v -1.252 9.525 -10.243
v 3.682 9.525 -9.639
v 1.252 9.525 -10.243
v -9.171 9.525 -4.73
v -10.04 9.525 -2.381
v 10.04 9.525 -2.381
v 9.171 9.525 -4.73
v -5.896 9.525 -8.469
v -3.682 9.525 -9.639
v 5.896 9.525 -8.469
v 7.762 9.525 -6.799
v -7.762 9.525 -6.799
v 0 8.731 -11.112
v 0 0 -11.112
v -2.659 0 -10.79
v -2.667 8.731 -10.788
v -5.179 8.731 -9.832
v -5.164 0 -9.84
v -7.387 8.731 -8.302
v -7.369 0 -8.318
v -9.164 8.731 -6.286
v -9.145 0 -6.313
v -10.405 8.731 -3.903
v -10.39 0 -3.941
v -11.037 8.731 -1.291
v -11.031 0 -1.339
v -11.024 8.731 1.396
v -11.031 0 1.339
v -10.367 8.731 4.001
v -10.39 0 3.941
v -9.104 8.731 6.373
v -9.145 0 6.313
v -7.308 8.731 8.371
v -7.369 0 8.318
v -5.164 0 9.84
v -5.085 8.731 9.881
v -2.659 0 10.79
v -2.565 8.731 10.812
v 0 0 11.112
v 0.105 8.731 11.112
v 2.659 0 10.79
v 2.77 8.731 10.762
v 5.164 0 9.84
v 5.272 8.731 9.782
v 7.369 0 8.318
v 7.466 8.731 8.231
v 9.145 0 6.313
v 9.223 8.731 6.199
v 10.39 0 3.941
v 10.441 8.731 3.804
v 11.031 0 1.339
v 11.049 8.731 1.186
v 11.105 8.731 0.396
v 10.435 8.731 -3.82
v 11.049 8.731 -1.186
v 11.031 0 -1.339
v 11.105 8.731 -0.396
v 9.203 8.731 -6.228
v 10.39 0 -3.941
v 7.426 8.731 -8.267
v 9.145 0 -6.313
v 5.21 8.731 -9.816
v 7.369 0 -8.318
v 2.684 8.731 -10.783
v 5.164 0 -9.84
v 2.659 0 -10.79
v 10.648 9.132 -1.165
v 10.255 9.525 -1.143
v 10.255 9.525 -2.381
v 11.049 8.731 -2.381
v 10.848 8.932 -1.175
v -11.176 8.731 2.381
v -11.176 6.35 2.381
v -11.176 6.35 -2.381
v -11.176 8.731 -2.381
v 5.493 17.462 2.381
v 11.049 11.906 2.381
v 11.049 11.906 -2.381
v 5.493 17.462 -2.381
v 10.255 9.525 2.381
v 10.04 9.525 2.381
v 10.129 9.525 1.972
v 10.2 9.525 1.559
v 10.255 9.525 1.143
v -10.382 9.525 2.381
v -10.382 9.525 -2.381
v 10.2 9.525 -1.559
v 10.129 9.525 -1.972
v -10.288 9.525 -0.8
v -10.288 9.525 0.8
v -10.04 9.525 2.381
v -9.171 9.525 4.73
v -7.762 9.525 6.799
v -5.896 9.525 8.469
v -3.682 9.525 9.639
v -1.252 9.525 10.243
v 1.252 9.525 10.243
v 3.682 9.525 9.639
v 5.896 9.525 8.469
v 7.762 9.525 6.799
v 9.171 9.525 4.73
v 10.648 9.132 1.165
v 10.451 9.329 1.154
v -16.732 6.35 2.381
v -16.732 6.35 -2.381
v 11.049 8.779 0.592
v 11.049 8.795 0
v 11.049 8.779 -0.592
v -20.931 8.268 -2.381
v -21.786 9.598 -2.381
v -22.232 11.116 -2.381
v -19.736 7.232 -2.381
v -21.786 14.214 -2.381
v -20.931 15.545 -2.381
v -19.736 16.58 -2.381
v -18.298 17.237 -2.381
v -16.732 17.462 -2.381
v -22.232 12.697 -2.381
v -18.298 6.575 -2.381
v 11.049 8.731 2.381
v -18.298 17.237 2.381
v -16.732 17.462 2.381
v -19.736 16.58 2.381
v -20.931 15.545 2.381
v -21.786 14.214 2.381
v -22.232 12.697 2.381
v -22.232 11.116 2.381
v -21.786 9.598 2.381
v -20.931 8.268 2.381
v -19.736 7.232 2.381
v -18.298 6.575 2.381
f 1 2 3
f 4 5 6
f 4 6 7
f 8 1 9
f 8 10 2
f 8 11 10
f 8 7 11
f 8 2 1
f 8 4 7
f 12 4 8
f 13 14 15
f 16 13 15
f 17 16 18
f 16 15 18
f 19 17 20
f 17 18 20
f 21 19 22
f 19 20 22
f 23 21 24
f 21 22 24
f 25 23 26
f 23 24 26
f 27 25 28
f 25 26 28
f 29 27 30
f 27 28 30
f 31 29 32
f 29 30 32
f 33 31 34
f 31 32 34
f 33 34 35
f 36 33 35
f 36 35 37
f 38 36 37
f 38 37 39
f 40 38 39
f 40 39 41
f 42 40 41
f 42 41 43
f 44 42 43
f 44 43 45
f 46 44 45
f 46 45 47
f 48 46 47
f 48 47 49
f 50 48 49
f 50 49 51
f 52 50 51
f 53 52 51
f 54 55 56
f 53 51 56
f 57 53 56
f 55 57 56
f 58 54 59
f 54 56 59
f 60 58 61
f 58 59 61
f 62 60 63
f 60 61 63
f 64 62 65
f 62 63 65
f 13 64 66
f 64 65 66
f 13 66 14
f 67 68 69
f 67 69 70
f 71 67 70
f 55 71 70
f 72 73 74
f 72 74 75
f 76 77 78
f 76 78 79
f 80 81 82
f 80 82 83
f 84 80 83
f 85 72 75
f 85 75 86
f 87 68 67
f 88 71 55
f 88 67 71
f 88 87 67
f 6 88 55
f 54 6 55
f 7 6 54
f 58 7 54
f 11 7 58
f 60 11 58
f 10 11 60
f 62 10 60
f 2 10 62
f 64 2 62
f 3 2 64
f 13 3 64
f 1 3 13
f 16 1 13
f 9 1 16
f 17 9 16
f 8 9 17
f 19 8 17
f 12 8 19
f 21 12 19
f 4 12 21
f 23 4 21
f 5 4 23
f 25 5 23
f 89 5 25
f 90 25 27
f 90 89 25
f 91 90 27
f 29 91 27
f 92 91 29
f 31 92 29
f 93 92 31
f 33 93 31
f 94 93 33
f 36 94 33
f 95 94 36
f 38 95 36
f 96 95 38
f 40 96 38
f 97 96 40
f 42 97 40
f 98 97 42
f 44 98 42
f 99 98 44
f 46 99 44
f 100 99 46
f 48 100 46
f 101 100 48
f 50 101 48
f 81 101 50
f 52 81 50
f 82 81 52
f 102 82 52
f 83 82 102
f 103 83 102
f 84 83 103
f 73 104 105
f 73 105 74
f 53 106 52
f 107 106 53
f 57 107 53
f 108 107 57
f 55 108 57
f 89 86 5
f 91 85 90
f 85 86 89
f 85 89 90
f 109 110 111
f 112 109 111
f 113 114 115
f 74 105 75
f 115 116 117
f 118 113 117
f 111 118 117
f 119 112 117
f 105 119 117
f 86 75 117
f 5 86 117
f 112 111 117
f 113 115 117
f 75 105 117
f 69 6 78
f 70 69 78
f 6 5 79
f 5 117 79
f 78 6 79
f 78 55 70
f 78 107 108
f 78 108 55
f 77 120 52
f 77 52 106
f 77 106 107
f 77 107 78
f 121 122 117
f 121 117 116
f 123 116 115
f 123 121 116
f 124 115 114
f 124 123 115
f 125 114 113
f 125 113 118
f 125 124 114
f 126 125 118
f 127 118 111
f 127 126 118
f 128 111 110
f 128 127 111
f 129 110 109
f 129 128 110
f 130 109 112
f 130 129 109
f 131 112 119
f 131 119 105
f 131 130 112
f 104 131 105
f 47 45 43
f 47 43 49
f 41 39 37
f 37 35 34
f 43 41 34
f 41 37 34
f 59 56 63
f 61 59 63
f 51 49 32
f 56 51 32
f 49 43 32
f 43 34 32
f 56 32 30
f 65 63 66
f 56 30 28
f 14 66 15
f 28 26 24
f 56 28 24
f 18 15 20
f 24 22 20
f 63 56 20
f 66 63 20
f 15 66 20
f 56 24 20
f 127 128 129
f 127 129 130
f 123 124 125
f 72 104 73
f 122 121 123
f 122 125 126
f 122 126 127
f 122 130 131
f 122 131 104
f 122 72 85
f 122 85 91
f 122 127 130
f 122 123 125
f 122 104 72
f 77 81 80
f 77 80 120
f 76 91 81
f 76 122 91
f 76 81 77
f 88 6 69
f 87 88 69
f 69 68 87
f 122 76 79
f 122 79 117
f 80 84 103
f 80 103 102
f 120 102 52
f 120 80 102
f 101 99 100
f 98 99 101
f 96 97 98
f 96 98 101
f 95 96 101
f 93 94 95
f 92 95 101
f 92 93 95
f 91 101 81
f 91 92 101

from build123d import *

# Parameters (mm, degrees)
SKETCH1_R            = 11.1125
BOSS_EXTRUDE1_DEPTH  = 9.525
CHAMFER1_SIZE        = 0.79375
BOSS_EXTRUDE30_DEPTH = 2.38125


with BuildPart() as part:
    # Sketch1 → Boss-Extrude1 (new body)
    with BuildSketch(Plane(origin=(0, 0, 0), x_dir=(1, 0, 0), z_dir=(0, 1, 0))):
        with Locations(Location((0, 0, 0), (0, 0, 90))):
            Circle(SKETCH1_R)
    extrude(amount=BOSS_EXTRUDE1_DEPTH)

    # Chamfer1
    chamfer1_edges = [part.edges().sort_by_distance(p)[0] for p in [
        (0, 9.525, 11.1125),
    ]]
    chamfer(chamfer1_edges, length=CHAMFER1_SIZE)

    # Sketch2 → Boss-Extrude30 (add, symmetric)
    with BuildSketch(Plane.XY):
        with BuildLine():
            Line((11.049, 8.73125), (11.049, 11.90625))
            Line((11.049, 11.90625), (5.49275, 17.4625))
            Line((5.49275, 17.4625), (-16.73225, 17.4625))
            ThreePointArc((-16.73225, 17.4625), (-22.2885, 11.90625), (-16.73225, 6.35))
            Line((-16.73225, 6.35), (-11.176, 6.35))
            Line((-11.176, 6.35), (-11.176, 8.73125))
            Line((-11.176, 8.73125), (-10.38225, 9.525))
            Line((-10.38225, 9.525), (10.25525, 9.525))
            Line((10.25525, 9.525), (11.049, 8.73125))
        make_face()
    extrude(amount=BOSS_EXTRUDE30_DEPTH, both=True)


solid = part.part
